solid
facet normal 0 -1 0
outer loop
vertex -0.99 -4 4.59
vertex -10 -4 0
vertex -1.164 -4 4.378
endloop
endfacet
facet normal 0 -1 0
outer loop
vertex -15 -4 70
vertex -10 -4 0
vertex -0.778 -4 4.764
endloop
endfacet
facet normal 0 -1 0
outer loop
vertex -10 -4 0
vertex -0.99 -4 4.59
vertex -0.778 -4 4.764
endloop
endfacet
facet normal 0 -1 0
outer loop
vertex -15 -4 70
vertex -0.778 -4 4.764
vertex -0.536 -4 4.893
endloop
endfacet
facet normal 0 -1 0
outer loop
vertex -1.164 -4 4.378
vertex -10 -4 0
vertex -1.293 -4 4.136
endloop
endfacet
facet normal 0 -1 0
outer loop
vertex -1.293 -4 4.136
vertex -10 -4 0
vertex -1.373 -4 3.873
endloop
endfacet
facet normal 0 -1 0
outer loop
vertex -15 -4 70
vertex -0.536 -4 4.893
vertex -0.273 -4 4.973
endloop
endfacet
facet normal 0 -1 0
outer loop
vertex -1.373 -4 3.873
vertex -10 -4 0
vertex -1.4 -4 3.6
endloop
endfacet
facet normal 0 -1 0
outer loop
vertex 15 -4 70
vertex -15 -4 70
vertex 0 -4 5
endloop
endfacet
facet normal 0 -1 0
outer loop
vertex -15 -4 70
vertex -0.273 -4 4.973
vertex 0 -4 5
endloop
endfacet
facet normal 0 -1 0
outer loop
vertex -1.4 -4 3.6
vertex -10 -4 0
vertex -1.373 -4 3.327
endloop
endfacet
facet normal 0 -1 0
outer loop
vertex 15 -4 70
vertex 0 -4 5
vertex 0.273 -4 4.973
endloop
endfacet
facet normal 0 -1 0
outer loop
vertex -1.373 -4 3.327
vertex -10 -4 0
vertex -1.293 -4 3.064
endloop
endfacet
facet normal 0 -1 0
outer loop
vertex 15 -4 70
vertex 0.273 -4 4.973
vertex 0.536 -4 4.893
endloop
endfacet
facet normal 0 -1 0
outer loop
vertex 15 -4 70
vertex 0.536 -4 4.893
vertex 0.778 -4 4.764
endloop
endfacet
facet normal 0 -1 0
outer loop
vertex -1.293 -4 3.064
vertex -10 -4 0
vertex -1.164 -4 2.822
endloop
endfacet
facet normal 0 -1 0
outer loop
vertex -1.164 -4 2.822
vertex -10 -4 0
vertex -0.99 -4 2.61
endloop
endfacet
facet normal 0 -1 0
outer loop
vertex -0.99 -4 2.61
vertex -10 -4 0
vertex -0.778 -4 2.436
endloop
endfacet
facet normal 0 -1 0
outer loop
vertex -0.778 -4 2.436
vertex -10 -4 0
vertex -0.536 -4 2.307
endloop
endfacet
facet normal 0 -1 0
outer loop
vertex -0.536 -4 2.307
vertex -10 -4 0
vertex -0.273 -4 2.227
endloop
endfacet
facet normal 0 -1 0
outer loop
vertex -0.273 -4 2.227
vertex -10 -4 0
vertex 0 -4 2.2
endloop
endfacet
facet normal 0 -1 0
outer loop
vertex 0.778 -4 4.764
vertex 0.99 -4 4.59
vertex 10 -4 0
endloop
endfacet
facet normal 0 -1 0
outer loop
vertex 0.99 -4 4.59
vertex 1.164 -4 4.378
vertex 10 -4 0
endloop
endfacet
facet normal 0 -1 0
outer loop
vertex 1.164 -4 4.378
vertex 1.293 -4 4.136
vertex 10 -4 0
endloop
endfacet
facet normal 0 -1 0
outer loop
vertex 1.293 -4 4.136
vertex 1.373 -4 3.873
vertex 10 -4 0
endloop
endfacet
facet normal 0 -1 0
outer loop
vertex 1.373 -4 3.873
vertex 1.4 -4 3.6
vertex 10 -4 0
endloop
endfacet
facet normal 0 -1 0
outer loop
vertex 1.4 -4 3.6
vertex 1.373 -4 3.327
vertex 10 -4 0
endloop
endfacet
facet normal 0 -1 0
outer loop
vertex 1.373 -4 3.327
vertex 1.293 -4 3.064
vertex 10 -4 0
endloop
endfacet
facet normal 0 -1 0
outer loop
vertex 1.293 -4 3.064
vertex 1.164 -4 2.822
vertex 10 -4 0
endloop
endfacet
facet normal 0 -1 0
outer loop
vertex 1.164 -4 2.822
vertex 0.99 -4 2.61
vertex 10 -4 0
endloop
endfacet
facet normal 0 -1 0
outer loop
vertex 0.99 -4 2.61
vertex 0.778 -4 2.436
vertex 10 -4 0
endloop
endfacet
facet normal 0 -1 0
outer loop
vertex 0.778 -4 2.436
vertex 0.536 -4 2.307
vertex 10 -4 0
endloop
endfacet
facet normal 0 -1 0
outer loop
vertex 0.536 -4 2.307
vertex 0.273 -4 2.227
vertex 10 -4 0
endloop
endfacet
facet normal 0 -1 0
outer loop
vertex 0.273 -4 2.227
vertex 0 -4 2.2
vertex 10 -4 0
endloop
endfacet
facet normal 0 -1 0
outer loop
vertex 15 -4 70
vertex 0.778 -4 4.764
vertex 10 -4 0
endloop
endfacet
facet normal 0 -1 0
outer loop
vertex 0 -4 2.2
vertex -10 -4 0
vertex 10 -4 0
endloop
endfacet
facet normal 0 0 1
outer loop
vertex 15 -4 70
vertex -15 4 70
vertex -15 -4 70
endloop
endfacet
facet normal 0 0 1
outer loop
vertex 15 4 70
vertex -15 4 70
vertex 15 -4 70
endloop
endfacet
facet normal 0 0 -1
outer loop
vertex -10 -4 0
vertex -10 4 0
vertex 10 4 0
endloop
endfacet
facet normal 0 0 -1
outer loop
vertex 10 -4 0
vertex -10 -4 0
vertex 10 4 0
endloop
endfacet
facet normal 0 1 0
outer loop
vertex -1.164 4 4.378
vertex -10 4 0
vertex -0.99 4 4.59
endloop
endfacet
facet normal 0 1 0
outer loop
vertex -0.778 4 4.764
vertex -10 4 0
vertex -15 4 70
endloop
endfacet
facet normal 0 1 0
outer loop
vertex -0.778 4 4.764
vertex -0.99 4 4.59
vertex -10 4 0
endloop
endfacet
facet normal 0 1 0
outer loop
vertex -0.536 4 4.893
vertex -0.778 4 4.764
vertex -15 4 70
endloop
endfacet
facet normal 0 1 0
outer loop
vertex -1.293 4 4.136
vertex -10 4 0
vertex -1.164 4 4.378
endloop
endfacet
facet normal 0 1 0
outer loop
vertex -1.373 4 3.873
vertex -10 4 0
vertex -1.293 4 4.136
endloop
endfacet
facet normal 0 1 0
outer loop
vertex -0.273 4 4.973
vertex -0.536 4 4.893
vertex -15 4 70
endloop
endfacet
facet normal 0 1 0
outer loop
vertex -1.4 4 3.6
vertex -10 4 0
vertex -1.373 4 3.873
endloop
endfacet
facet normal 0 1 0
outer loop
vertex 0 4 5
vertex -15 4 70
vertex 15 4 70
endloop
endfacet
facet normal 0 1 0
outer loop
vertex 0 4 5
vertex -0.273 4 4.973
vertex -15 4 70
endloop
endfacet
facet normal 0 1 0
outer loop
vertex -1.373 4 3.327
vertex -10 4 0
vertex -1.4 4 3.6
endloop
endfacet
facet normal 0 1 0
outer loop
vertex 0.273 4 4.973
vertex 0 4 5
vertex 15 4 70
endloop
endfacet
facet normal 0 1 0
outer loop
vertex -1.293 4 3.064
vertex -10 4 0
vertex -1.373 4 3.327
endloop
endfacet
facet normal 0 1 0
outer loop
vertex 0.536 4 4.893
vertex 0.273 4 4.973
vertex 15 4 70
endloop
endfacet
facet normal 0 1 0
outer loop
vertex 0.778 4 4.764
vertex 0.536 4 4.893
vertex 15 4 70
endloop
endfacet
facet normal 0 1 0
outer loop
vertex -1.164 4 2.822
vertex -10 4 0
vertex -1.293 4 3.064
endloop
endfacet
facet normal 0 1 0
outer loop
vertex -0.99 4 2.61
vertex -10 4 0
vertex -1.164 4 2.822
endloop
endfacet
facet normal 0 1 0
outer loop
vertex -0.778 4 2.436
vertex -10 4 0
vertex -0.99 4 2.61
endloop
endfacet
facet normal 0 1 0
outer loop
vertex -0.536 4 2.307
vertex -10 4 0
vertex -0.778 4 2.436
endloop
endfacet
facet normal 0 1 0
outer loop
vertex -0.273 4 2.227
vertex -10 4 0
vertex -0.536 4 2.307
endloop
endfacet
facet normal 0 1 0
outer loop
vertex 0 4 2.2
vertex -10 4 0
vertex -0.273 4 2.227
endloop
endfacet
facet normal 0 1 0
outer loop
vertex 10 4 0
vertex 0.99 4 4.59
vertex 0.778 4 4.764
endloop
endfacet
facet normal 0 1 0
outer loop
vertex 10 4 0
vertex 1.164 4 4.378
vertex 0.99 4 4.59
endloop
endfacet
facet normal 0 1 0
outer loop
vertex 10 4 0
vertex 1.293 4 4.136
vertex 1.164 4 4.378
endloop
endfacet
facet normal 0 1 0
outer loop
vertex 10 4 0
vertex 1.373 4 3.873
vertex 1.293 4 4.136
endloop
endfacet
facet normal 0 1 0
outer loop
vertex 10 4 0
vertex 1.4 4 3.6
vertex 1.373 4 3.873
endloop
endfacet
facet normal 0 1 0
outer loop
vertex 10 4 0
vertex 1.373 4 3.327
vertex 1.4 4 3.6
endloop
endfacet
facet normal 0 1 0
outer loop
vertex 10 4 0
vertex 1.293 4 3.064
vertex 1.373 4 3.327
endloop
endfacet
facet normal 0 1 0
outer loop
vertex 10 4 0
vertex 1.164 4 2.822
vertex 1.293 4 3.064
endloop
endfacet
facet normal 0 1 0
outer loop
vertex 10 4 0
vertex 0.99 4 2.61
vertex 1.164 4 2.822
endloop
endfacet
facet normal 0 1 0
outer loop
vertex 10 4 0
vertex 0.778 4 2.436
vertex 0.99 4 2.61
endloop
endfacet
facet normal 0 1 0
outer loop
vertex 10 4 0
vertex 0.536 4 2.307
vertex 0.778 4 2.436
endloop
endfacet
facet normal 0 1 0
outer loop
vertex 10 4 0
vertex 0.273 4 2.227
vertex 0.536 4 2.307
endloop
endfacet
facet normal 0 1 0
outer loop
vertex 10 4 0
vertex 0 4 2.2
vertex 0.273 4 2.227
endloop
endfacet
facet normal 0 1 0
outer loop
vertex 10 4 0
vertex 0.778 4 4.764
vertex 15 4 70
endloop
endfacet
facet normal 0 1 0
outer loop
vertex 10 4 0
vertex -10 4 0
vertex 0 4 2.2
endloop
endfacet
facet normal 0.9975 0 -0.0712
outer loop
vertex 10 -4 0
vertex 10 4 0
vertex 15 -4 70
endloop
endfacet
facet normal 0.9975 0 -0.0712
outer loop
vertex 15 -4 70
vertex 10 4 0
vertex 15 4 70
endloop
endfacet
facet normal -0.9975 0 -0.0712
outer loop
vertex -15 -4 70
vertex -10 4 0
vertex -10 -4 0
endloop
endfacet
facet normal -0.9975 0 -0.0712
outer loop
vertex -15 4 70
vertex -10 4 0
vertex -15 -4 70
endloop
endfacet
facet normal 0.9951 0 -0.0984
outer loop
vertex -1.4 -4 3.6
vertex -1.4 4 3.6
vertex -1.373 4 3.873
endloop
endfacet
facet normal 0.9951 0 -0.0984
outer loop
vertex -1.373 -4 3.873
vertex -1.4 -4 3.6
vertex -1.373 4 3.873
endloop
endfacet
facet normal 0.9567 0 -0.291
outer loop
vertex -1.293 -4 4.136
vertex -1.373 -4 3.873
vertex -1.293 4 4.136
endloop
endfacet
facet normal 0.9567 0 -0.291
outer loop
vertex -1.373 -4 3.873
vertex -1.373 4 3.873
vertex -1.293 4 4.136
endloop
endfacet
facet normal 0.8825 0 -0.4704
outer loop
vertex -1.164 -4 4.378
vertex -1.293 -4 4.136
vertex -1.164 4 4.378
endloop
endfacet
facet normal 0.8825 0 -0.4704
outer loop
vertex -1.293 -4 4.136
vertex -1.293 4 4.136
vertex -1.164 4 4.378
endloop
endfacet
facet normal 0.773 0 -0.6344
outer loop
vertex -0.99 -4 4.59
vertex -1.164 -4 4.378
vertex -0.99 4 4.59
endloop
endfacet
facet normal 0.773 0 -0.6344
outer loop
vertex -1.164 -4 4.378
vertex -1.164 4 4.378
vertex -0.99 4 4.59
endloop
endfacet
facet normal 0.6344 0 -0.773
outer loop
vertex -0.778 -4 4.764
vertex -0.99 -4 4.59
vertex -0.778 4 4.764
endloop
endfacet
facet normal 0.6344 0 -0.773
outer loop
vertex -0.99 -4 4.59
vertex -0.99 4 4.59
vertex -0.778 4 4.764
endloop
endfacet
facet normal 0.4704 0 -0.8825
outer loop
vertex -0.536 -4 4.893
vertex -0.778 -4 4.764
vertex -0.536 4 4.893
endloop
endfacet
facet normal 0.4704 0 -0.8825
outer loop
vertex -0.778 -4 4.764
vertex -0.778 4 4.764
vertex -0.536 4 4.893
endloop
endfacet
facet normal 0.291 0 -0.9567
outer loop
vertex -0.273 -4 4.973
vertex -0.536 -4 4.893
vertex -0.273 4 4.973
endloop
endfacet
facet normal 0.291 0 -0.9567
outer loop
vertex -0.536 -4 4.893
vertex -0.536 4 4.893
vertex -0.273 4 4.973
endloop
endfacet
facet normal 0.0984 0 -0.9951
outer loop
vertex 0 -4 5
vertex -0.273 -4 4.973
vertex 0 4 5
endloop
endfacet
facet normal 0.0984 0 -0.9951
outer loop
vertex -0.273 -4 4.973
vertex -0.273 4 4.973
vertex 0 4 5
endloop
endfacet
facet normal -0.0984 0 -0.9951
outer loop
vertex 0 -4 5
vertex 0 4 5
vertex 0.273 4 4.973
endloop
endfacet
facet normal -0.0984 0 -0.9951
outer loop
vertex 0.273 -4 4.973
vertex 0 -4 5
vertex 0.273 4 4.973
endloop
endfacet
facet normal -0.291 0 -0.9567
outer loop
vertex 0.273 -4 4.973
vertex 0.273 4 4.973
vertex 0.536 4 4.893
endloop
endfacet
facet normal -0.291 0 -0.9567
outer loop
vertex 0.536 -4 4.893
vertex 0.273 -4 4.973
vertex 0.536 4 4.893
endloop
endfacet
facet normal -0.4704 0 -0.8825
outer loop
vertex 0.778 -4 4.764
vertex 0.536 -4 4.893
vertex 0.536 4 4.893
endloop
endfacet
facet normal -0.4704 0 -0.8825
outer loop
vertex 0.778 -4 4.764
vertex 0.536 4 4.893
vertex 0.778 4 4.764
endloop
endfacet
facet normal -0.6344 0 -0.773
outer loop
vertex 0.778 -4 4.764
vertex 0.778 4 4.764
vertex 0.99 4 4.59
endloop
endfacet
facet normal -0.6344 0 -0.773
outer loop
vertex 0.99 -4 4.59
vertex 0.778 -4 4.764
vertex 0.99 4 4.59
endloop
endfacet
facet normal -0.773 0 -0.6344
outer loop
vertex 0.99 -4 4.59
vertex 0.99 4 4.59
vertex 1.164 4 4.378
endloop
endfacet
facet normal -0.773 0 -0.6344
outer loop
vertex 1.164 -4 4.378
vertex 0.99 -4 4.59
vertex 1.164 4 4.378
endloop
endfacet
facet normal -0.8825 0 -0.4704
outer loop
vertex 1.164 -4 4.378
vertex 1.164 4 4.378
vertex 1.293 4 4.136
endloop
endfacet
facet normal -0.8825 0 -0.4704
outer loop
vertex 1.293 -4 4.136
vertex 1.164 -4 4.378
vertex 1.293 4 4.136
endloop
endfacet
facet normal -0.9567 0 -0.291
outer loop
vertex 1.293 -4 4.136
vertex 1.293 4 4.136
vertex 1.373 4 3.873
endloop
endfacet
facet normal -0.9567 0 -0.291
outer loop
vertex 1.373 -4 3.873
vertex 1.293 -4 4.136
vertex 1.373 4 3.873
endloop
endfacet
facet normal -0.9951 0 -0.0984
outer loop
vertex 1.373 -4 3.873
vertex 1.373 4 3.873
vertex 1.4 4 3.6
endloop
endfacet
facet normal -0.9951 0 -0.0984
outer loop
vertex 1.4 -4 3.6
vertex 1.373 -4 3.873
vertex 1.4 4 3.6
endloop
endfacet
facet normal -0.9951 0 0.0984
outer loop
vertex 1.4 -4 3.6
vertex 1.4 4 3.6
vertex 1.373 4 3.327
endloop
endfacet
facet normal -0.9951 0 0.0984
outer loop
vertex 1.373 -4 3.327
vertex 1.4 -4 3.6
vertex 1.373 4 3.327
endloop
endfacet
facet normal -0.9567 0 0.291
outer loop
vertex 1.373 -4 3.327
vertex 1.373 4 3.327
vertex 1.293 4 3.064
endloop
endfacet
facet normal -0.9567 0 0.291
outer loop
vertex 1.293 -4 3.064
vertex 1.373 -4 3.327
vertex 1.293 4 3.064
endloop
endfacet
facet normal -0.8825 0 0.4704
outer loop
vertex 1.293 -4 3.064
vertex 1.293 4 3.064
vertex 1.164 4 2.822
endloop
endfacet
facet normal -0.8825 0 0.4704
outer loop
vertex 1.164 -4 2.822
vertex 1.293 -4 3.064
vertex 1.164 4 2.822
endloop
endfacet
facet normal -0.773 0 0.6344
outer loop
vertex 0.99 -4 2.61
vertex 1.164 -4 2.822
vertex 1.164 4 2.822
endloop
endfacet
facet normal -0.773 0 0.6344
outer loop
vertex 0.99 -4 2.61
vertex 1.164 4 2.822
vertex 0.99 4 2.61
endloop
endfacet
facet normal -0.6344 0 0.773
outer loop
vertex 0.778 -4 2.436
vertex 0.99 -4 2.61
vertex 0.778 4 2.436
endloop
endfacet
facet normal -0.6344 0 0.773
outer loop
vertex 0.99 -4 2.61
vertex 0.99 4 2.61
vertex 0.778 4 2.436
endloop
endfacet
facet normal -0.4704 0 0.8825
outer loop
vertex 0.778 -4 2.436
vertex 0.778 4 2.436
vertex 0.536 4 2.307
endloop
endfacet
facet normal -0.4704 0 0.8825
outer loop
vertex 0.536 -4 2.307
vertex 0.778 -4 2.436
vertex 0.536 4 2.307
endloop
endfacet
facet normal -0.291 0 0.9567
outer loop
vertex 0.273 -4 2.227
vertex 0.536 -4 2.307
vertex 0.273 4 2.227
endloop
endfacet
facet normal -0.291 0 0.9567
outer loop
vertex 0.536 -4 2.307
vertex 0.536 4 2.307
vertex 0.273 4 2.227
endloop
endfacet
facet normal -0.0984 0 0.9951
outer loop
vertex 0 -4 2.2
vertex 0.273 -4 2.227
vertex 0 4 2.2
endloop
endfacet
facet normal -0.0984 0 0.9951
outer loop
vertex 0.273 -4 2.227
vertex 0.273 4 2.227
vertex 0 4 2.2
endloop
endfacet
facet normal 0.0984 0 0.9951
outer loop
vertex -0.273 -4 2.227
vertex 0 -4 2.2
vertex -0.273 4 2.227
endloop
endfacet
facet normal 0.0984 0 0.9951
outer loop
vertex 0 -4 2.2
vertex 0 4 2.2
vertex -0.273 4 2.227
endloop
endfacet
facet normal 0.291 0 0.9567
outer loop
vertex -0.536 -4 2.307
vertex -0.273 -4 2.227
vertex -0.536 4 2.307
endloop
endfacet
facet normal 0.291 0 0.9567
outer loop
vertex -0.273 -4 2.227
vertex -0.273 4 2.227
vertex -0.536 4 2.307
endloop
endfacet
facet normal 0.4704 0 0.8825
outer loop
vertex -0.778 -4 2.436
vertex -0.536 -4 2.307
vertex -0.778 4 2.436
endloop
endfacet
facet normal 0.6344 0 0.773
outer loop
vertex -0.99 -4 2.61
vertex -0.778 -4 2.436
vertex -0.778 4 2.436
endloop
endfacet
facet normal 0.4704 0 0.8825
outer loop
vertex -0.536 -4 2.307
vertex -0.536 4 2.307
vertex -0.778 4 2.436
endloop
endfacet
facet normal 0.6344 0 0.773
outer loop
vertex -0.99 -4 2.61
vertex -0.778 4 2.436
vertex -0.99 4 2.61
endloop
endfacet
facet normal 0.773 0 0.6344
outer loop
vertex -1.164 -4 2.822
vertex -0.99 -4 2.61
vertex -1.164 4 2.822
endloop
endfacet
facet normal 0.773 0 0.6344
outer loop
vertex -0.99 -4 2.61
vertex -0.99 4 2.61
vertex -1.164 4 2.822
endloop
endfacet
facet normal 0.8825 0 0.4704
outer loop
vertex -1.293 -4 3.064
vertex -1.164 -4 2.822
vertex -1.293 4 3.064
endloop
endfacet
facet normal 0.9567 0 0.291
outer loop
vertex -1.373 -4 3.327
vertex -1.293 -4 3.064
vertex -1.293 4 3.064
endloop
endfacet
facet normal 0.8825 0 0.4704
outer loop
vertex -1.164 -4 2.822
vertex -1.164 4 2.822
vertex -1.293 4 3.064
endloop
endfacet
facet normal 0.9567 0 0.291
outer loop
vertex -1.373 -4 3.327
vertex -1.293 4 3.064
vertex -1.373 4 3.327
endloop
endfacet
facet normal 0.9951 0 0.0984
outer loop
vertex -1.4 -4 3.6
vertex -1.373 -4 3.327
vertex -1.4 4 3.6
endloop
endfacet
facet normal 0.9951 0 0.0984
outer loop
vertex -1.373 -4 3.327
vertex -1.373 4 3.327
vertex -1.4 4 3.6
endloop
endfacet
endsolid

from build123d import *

# Parameters (mm, degrees)
SKETCH1_W           = 30
SKETCH1_H           = 8
BOSS_EXTRUDE1_DEPTH = 70
CUT_EXTRUDE1_DEPTH  = 70
SKETCH5_R           = 1.4
CUT_EXTRUDE3_DEPTH  = 100


with BuildPart() as part:
    # Sketch1 → Boss-Extrude1 (new body)
    with BuildSketch(Plane.XY):
        Rectangle(SKETCH1_W, SKETCH1_H)
    extrude(amount=BOSS_EXTRUDE1_DEPTH)

    # Sketch4 → Cut-Extrude1 (cut)
    with BuildSketch(Plane(origin=(0, 4, 0), x_dir=(1, 0, 0), z_dir=(0, 1, 0))):
        Polygon((-15, 0), (-10, 0), (-15, -70), align=None)
        Polygon((15, 0), (10, 0), (15, -70), align=None)
    extrude(amount=-CUT_EXTRUDE1_DEPTH, mode=Mode.SUBTRACT)

    # Sketch5 → Cut-Extrude3 (cut)
    with BuildSketch(Plane(origin=(0, 4, 0), x_dir=(1, 0, 0), z_dir=(0, 1, 0))):
        with Locations(Location((0, -3.6, 0), (0, 0, 180))):
            Circle(SKETCH5_R)
    extrude(amount=-CUT_EXTRUDE3_DEPTH, mode=Mode.SUBTRACT)


solid = part.part
